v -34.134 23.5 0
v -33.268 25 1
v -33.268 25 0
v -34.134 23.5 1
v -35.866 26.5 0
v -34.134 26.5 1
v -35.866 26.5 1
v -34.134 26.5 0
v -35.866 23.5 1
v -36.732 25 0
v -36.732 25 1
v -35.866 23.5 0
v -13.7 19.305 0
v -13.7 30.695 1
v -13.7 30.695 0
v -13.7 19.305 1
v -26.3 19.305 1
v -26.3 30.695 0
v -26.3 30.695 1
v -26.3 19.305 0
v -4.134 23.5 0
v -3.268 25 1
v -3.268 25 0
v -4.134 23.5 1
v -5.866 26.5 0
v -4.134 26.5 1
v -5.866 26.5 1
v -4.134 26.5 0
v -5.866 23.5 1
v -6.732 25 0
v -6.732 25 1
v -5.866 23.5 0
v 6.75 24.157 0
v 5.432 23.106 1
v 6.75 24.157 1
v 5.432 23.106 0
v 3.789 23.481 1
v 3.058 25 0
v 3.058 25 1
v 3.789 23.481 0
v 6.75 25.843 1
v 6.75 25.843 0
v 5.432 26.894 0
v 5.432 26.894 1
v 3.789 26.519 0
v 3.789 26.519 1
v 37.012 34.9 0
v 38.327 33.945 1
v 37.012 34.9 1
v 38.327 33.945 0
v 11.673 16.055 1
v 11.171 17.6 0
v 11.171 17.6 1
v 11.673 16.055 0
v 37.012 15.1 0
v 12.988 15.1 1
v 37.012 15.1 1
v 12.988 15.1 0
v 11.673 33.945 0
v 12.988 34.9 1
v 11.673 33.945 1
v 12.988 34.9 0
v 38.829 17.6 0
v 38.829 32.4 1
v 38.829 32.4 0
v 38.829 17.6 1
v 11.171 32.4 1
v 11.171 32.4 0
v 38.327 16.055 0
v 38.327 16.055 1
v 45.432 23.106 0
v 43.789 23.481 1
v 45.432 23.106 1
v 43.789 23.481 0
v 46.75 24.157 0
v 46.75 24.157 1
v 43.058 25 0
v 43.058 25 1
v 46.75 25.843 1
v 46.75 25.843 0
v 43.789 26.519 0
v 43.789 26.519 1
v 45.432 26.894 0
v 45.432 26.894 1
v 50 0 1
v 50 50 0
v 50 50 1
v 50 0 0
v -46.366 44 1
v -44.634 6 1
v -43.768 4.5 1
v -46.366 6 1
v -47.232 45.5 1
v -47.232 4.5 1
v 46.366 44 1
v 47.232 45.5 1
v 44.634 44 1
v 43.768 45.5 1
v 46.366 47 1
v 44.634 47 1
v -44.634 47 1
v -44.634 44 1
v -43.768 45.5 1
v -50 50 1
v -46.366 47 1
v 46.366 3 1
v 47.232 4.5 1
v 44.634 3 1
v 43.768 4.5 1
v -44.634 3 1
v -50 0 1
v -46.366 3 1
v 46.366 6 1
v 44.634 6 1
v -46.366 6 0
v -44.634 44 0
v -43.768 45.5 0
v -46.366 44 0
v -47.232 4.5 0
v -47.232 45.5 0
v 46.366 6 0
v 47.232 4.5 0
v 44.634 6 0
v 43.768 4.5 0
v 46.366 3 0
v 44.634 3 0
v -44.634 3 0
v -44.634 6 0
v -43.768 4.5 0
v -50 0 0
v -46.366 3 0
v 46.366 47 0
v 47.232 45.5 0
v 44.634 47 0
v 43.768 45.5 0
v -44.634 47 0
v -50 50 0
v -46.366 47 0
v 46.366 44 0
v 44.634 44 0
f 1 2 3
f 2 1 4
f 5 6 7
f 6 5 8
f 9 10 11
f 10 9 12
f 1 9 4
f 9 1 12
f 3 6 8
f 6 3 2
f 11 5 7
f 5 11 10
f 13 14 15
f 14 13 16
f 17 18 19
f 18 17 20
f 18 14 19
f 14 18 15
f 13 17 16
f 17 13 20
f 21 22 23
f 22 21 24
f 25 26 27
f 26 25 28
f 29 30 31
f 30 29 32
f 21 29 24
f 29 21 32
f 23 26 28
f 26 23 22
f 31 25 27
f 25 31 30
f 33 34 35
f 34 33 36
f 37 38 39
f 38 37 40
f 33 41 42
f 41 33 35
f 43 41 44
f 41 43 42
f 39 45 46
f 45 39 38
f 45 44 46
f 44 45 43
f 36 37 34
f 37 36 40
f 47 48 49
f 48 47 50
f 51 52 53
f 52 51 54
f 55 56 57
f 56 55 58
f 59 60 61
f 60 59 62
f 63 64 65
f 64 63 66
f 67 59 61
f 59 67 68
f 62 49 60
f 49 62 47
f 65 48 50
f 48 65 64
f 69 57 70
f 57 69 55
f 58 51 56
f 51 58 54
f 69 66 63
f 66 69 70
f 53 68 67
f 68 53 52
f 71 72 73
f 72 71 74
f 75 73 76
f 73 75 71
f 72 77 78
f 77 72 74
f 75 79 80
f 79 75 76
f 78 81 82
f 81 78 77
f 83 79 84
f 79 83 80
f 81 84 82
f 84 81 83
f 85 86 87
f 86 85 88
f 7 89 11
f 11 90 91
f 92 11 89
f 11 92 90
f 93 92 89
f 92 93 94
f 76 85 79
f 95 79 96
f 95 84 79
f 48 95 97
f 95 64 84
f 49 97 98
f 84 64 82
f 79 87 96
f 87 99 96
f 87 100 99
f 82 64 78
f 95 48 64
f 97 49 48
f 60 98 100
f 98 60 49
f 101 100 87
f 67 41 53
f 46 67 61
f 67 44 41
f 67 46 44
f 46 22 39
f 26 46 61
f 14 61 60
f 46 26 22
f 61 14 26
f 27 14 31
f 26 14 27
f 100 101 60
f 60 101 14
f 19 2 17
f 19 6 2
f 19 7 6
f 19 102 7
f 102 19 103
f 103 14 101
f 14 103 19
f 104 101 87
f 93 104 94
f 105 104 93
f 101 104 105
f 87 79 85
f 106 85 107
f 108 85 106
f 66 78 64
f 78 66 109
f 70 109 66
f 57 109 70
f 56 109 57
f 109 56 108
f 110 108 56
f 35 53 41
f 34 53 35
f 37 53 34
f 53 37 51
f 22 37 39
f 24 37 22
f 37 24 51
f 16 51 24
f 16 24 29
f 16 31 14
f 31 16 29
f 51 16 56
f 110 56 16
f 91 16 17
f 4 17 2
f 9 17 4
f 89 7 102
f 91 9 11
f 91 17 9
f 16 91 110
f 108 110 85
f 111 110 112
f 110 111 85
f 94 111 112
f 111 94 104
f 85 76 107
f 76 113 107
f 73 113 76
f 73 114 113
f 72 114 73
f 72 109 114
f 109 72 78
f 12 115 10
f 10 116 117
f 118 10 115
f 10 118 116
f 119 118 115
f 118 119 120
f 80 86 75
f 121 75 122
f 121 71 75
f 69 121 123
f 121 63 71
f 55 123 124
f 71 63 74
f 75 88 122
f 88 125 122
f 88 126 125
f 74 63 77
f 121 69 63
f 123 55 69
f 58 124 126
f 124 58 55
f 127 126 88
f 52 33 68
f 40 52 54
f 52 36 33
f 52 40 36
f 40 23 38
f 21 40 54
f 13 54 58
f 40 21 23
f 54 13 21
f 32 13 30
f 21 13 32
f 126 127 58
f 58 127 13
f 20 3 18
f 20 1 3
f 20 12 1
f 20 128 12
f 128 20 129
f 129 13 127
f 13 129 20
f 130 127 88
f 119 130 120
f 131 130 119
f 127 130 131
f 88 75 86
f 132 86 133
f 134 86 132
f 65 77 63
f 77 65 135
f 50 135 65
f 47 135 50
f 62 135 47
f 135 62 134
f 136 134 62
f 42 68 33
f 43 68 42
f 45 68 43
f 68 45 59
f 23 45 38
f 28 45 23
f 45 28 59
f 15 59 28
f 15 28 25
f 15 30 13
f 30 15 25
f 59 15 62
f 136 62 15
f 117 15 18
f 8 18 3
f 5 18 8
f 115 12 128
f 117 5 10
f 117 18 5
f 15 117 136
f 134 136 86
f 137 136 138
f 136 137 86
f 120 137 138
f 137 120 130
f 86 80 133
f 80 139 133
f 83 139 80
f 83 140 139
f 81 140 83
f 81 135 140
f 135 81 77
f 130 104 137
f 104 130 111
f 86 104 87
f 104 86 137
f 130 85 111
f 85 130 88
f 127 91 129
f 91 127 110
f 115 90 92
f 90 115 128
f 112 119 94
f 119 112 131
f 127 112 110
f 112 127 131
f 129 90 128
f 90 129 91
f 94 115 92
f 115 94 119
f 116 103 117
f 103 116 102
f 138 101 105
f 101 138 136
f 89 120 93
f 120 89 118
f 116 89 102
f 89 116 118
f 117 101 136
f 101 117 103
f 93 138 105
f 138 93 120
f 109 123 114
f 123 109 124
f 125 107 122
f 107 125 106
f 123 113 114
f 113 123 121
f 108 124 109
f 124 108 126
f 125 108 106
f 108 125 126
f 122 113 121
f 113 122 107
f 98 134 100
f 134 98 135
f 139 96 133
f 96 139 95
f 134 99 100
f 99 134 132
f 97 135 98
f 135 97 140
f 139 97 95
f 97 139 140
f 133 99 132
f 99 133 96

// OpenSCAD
use <MCAD/nuts_and_bolts.scad>

PanelHeight=50;
PanelWidth=100;
PanelThickness=1;

MountingHoleDiameter=3;

CaseThickness=20;
CaseHeight=100;

j=0.01;
t=PanelThickness;



difference()
{
	// Main Panel Body
	translate([-PanelWidth/2, 0, 0])
	cube([PanelWidth, PanelHeight, t]);
	
	// Main mounting holes
	translate([-PanelWidth/2+MountingHoleDiameter*1.5, MountingHoleDiameter*1.5, -j]) polyhole(d=MountingHoleDiameter, h=t+j*2);
	translate([-PanelWidth/2+MountingHoleDiameter*1.5, PanelHeight-MountingHoleDiameter*1.5, -j]) polyhole(d=MountingHoleDiameter, h=t+j*2);
	translate([PanelWidth/2-MountingHoleDiameter*1.5, MountingHoleDiameter*1.5, -j]) polyhole(d=MountingHoleDiameter, h=t+j*2);
	translate([PanelWidth/2-MountingHoleDiameter*1.5, PanelHeight-MountingHoleDiameter*1.5, -j]) polyhole(d=MountingHoleDiameter, h=t+j*2);
	
	// USB connection
	translate([-20, 25, 0]) USB_Socket();

	// Power connection
	translate([25, 25, 0]) C14_Socket("front");
}

%translate([-250, -(CaseHeight-PanelHeight)/2, -CaseThickness]) cube([500, CaseHeight, CaseThickness]);



// http://www.kenable.co.uk/product_info.php?products_id=4324
module USB_Socket()
{
	centres=30;
	hole_diameter=3;
	cutout_width=12.6;
	cutout_height=11.39;
	
	translate([-centres/2, 0, 0])
	union()
	{
		translate([0, 0, -j]) polyhole(d=hole_diameter, h=t+j*2);
		translate([centres/2-cutout_width/2, -cutout_height/2, -j]) cube([cutout_width, cutout_height, t+j*2]);
		translate([centres, 0, -j]) polyhole(d=hole_diameter, h=t+j*2);
	}
}


// http://www.kenable.co.uk/product_info.php?products_id=3522
module C14_Socket(mounting="front")
{
	centres=40;
	hole_diameter=3.5;
	front_cutout_width=27.4;
	front_cutout_height=19.8;
	front_corner_radius=5;

	rear_cutout_width=30.2;
	rear_cutout_height=22.7;
	rear_corner_radius=5.9;

	translate([-centres/2, 0, 0])
	union()
	{
		translate([0, 0, -j])
		polyhole(d=hole_diameter, h=t+j*2);
		
		if(mounting=="front")
		{
			translate([centres/2-front_cutout_width/2, -front_cutout_height/2, 0])
			hull()
			{
				translate([front_corner_radius/2, front_corner_radius/2, -j]) polyhole(d=front_corner_radius, h=t+j*2);
				translate([front_cutout_width-front_corner_radius/2, front_corner_radius/2, -j]) polyhole(d=front_corner_radius, h=t+j*2);
				translate([front_corner_radius/2, front_cutout_height-front_corner_radius/2, -j]) polyhole(d=front_corner_radius, h=t+j*2);
				translate([front_cutout_width-front_corner_radius/2, front_cutout_height-front_corner_radius/2, -j]) polyhole(d=front_corner_radius, h=t+j*2);
			}
		}
		if(mounting=="rear")
		{
			translate([centres/2-rear_cutout_width/2, -rear_cutout_height/2, 0])
			hull()
			{
				translate([rear_corner_radius/2, rear_corner_radius/2, -j]) polyhole(d=rear_corner_radius, h=t+j*2);
				translate([rear_cutout_width-rear_corner_radius/2, rear_corner_radius/2, -j]) polyhole(d=rear_corner_radius, h=t+j*2);
				translate([rear_corner_radius/2, rear_cutout_height-rear_corner_radius/2, -j]) polyhole(d=rear_corner_radius, h=t+j*2);	
				translate([rear_cutout_width-rear_corner_radius/2, rear_cutout_height-rear_corner_radius/2, -j]) polyhole(d=rear_corner_radius, h=t+j*2);
			}
		}
		
		translate([centres, 0, -j]) polyhole(d=hole_diameter, h=t+j*2);
	}
}


// By nophead
module polyhole( d, h )
{
	n = max( round( 2 * d ), 3 );
	rotate( [0, 0, 180] ) cylinder( h = h, r = ( d / 2 ) / cos( 180 / n ), $fn = n );
}
